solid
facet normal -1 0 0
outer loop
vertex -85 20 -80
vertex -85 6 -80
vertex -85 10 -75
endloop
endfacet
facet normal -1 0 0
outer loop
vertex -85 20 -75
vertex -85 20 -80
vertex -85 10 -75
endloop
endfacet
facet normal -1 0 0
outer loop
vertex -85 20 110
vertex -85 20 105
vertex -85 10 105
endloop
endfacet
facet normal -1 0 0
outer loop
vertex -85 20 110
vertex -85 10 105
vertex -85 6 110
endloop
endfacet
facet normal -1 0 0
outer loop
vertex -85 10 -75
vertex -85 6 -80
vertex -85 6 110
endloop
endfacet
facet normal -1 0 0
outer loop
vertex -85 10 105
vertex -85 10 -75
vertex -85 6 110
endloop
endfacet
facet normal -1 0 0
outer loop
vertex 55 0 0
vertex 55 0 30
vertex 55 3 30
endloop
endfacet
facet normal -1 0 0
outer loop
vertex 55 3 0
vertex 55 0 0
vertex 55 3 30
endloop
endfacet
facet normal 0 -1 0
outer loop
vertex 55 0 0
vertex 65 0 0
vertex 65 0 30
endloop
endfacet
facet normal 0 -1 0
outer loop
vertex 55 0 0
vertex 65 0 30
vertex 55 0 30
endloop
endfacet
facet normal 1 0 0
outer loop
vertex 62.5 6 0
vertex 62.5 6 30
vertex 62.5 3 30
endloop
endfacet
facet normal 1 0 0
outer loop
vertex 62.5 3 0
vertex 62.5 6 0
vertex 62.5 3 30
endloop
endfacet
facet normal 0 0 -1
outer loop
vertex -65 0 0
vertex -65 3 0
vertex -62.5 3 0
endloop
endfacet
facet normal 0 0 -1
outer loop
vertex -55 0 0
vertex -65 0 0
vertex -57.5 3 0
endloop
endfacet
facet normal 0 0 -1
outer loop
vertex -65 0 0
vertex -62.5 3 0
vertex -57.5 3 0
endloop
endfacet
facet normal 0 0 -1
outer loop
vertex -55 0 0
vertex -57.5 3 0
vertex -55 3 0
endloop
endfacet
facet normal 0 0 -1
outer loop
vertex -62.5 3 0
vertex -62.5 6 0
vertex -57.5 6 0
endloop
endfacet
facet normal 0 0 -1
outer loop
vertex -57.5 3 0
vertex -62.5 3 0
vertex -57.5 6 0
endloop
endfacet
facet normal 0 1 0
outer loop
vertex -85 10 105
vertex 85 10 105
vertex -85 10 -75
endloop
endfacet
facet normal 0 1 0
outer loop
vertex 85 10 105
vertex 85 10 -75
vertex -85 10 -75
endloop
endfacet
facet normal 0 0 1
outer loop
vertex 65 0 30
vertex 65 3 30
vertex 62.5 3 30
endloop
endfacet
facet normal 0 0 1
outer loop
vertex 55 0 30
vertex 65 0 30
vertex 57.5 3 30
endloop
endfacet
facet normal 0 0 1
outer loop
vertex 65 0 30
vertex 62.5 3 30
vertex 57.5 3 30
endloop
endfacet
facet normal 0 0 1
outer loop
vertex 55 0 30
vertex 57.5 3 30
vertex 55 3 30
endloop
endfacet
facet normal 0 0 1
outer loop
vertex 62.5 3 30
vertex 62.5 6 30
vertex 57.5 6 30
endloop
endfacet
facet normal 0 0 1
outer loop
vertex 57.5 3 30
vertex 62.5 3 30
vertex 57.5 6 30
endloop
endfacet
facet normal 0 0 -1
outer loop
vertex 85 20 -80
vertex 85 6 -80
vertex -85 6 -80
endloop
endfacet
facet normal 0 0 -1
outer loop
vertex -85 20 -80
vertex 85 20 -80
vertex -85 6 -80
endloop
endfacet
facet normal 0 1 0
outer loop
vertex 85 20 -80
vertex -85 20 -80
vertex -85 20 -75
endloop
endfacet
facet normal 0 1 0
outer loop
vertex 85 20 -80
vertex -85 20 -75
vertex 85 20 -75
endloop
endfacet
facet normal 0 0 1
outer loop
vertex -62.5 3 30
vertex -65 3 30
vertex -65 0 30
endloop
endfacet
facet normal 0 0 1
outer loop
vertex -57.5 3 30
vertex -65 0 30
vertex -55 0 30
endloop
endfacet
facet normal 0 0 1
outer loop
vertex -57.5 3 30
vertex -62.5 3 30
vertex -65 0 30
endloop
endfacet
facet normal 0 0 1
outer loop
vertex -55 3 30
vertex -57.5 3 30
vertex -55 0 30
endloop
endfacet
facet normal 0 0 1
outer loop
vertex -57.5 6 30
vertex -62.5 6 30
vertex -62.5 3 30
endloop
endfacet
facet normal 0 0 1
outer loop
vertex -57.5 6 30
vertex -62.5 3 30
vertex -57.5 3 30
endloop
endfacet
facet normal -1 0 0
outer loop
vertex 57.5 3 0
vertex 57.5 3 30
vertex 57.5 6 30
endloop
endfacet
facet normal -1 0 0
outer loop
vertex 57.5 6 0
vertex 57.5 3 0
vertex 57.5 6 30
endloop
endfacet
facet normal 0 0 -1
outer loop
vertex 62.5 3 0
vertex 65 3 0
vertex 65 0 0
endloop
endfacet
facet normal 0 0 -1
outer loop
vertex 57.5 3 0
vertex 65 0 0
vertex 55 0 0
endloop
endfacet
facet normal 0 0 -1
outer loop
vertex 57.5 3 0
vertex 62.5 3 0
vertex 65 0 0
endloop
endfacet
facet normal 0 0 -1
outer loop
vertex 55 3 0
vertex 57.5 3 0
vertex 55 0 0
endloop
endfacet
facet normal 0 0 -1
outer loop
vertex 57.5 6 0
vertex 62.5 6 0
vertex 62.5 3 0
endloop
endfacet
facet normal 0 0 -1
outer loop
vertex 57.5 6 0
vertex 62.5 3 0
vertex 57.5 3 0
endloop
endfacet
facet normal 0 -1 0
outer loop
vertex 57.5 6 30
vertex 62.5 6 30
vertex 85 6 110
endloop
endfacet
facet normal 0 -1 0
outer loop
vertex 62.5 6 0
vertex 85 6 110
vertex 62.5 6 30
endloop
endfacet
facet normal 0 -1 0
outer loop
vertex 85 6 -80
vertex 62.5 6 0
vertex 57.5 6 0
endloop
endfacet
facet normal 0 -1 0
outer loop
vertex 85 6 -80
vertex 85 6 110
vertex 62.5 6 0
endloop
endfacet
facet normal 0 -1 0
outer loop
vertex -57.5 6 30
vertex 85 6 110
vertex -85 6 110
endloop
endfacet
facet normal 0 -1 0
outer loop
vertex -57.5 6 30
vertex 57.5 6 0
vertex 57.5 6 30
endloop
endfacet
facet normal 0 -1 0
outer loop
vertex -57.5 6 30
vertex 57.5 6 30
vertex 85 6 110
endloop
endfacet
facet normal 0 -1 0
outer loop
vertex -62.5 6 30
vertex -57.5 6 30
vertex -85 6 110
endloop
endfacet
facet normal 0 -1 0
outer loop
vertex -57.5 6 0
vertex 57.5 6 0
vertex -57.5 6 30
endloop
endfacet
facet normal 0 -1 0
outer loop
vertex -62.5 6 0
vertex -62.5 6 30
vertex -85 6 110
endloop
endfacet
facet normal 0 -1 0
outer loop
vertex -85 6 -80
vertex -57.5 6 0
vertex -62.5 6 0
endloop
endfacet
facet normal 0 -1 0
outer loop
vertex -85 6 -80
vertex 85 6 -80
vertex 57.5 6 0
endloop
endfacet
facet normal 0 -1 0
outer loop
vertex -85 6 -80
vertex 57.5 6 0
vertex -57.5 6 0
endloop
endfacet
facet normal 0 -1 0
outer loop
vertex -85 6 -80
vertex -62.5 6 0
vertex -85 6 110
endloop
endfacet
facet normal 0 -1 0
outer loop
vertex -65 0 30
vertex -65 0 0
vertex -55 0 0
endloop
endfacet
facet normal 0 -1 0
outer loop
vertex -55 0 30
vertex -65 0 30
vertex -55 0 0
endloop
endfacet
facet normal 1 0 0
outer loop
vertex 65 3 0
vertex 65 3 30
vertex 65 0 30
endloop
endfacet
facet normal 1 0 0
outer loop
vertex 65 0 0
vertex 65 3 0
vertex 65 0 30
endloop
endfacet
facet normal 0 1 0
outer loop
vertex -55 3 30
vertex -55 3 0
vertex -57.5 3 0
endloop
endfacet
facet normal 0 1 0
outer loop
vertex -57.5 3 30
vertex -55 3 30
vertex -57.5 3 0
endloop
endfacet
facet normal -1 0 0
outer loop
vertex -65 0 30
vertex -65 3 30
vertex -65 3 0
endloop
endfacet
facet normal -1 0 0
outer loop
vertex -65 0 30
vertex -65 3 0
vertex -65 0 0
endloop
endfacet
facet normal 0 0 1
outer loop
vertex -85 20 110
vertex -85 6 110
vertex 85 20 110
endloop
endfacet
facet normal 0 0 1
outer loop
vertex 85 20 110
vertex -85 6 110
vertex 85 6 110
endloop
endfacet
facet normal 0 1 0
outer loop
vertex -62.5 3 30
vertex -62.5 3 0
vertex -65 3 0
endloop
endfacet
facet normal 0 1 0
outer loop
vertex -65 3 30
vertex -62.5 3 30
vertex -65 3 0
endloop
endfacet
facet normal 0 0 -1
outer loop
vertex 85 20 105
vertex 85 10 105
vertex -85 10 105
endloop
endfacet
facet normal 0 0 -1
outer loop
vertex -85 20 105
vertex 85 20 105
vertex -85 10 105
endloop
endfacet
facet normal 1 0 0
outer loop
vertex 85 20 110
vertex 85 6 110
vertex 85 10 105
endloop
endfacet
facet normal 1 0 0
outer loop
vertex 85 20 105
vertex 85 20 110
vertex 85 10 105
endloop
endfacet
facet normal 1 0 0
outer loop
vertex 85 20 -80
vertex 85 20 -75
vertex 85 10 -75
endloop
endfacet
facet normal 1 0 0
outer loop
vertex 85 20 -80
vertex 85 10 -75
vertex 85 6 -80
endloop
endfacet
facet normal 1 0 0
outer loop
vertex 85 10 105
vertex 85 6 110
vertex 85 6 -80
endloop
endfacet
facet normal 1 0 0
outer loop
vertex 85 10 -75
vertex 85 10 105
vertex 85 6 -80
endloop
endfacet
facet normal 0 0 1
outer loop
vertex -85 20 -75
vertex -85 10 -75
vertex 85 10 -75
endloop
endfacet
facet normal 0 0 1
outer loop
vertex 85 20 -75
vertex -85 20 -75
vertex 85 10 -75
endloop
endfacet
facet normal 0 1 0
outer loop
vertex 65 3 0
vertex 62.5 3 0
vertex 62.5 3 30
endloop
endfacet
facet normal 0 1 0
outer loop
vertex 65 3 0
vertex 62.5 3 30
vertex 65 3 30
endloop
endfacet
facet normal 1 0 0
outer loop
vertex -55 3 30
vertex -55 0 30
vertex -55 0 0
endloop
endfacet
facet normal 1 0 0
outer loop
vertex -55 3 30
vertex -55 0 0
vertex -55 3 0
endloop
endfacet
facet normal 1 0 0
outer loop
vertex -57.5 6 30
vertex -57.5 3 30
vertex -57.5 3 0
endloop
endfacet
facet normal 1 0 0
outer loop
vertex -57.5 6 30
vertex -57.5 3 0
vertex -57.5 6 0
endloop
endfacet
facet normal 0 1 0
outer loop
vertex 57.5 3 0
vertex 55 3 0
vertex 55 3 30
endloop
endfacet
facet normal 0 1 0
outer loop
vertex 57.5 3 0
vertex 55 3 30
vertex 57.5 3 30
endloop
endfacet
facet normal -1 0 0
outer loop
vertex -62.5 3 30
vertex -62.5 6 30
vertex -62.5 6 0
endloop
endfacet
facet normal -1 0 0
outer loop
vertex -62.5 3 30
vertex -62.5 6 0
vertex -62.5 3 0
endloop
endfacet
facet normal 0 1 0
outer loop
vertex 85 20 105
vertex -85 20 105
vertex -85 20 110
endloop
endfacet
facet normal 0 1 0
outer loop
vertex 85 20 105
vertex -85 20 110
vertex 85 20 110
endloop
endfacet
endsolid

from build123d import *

# Parameters (mm, degrees)
EXTRUDE_1_DEPTH   = 30
EXTRUDE_1_2_DEPTH = 30
EXTRUDE_2_DEPTH   = 4
EXTRUDE_3_DEPTH   = 10


with BuildPart() as part:
    # 草图1 → 凸台-拉伸1 (new body)
    with BuildSketch(Plane.XY):
        Polygon((-55, 0), (-55, 3), (-57.5, 3), (-57.5, 6), (-62.5, 6), (-62.5, 3), (-65, 3), (-65, 0), align=None)
    extrude(amount=EXTRUDE_1_DEPTH)



with BuildPart() as body_2:
    # 草图1 → Extrude 1 2 (new body)
    with BuildSketch(Plane.XY):
        Polygon((65, 0), (55, 0), (55, 3), (57.5, 3), (57.5, 6), (62.5, 6), (62.5, 3), (65, 3), align=None)
    extrude(amount=EXTRUDE_1_2_DEPTH)


with BuildPart() as part_1:
    add(part.part)

    add(body_2.part)  # 凸台-拉伸2 merges body 2
    # 草图2 → 凸台-拉伸2 (add)
    with BuildSketch(Plane(origin=(0, 6, 0), x_dir=(1, 0, 0), z_dir=(0, 1, 0))):
        Polygon((0, -110), (-85, -110), (-85, 80), (85, 80), (85, -110), align=None)
    extrude(amount=EXTRUDE_2_DEPTH)

    # 草图3 → 凸台-拉伸3 (add)
    with BuildSketch(Plane(origin=(0, 10, 0), x_dir=(1, 0, 0), z_dir=(0, 1, 0))):
        Polygon((-85, 80), (-85, 75), (80, 75), (85, 75), (85, 80), align=None)
        Polygon((80, -105), (-85, -105), (-85, -110), (85, -110), (85, -105), align=None)
    extrude(amount=EXTRUDE_3_DEPTH)


solid = part_1.part
